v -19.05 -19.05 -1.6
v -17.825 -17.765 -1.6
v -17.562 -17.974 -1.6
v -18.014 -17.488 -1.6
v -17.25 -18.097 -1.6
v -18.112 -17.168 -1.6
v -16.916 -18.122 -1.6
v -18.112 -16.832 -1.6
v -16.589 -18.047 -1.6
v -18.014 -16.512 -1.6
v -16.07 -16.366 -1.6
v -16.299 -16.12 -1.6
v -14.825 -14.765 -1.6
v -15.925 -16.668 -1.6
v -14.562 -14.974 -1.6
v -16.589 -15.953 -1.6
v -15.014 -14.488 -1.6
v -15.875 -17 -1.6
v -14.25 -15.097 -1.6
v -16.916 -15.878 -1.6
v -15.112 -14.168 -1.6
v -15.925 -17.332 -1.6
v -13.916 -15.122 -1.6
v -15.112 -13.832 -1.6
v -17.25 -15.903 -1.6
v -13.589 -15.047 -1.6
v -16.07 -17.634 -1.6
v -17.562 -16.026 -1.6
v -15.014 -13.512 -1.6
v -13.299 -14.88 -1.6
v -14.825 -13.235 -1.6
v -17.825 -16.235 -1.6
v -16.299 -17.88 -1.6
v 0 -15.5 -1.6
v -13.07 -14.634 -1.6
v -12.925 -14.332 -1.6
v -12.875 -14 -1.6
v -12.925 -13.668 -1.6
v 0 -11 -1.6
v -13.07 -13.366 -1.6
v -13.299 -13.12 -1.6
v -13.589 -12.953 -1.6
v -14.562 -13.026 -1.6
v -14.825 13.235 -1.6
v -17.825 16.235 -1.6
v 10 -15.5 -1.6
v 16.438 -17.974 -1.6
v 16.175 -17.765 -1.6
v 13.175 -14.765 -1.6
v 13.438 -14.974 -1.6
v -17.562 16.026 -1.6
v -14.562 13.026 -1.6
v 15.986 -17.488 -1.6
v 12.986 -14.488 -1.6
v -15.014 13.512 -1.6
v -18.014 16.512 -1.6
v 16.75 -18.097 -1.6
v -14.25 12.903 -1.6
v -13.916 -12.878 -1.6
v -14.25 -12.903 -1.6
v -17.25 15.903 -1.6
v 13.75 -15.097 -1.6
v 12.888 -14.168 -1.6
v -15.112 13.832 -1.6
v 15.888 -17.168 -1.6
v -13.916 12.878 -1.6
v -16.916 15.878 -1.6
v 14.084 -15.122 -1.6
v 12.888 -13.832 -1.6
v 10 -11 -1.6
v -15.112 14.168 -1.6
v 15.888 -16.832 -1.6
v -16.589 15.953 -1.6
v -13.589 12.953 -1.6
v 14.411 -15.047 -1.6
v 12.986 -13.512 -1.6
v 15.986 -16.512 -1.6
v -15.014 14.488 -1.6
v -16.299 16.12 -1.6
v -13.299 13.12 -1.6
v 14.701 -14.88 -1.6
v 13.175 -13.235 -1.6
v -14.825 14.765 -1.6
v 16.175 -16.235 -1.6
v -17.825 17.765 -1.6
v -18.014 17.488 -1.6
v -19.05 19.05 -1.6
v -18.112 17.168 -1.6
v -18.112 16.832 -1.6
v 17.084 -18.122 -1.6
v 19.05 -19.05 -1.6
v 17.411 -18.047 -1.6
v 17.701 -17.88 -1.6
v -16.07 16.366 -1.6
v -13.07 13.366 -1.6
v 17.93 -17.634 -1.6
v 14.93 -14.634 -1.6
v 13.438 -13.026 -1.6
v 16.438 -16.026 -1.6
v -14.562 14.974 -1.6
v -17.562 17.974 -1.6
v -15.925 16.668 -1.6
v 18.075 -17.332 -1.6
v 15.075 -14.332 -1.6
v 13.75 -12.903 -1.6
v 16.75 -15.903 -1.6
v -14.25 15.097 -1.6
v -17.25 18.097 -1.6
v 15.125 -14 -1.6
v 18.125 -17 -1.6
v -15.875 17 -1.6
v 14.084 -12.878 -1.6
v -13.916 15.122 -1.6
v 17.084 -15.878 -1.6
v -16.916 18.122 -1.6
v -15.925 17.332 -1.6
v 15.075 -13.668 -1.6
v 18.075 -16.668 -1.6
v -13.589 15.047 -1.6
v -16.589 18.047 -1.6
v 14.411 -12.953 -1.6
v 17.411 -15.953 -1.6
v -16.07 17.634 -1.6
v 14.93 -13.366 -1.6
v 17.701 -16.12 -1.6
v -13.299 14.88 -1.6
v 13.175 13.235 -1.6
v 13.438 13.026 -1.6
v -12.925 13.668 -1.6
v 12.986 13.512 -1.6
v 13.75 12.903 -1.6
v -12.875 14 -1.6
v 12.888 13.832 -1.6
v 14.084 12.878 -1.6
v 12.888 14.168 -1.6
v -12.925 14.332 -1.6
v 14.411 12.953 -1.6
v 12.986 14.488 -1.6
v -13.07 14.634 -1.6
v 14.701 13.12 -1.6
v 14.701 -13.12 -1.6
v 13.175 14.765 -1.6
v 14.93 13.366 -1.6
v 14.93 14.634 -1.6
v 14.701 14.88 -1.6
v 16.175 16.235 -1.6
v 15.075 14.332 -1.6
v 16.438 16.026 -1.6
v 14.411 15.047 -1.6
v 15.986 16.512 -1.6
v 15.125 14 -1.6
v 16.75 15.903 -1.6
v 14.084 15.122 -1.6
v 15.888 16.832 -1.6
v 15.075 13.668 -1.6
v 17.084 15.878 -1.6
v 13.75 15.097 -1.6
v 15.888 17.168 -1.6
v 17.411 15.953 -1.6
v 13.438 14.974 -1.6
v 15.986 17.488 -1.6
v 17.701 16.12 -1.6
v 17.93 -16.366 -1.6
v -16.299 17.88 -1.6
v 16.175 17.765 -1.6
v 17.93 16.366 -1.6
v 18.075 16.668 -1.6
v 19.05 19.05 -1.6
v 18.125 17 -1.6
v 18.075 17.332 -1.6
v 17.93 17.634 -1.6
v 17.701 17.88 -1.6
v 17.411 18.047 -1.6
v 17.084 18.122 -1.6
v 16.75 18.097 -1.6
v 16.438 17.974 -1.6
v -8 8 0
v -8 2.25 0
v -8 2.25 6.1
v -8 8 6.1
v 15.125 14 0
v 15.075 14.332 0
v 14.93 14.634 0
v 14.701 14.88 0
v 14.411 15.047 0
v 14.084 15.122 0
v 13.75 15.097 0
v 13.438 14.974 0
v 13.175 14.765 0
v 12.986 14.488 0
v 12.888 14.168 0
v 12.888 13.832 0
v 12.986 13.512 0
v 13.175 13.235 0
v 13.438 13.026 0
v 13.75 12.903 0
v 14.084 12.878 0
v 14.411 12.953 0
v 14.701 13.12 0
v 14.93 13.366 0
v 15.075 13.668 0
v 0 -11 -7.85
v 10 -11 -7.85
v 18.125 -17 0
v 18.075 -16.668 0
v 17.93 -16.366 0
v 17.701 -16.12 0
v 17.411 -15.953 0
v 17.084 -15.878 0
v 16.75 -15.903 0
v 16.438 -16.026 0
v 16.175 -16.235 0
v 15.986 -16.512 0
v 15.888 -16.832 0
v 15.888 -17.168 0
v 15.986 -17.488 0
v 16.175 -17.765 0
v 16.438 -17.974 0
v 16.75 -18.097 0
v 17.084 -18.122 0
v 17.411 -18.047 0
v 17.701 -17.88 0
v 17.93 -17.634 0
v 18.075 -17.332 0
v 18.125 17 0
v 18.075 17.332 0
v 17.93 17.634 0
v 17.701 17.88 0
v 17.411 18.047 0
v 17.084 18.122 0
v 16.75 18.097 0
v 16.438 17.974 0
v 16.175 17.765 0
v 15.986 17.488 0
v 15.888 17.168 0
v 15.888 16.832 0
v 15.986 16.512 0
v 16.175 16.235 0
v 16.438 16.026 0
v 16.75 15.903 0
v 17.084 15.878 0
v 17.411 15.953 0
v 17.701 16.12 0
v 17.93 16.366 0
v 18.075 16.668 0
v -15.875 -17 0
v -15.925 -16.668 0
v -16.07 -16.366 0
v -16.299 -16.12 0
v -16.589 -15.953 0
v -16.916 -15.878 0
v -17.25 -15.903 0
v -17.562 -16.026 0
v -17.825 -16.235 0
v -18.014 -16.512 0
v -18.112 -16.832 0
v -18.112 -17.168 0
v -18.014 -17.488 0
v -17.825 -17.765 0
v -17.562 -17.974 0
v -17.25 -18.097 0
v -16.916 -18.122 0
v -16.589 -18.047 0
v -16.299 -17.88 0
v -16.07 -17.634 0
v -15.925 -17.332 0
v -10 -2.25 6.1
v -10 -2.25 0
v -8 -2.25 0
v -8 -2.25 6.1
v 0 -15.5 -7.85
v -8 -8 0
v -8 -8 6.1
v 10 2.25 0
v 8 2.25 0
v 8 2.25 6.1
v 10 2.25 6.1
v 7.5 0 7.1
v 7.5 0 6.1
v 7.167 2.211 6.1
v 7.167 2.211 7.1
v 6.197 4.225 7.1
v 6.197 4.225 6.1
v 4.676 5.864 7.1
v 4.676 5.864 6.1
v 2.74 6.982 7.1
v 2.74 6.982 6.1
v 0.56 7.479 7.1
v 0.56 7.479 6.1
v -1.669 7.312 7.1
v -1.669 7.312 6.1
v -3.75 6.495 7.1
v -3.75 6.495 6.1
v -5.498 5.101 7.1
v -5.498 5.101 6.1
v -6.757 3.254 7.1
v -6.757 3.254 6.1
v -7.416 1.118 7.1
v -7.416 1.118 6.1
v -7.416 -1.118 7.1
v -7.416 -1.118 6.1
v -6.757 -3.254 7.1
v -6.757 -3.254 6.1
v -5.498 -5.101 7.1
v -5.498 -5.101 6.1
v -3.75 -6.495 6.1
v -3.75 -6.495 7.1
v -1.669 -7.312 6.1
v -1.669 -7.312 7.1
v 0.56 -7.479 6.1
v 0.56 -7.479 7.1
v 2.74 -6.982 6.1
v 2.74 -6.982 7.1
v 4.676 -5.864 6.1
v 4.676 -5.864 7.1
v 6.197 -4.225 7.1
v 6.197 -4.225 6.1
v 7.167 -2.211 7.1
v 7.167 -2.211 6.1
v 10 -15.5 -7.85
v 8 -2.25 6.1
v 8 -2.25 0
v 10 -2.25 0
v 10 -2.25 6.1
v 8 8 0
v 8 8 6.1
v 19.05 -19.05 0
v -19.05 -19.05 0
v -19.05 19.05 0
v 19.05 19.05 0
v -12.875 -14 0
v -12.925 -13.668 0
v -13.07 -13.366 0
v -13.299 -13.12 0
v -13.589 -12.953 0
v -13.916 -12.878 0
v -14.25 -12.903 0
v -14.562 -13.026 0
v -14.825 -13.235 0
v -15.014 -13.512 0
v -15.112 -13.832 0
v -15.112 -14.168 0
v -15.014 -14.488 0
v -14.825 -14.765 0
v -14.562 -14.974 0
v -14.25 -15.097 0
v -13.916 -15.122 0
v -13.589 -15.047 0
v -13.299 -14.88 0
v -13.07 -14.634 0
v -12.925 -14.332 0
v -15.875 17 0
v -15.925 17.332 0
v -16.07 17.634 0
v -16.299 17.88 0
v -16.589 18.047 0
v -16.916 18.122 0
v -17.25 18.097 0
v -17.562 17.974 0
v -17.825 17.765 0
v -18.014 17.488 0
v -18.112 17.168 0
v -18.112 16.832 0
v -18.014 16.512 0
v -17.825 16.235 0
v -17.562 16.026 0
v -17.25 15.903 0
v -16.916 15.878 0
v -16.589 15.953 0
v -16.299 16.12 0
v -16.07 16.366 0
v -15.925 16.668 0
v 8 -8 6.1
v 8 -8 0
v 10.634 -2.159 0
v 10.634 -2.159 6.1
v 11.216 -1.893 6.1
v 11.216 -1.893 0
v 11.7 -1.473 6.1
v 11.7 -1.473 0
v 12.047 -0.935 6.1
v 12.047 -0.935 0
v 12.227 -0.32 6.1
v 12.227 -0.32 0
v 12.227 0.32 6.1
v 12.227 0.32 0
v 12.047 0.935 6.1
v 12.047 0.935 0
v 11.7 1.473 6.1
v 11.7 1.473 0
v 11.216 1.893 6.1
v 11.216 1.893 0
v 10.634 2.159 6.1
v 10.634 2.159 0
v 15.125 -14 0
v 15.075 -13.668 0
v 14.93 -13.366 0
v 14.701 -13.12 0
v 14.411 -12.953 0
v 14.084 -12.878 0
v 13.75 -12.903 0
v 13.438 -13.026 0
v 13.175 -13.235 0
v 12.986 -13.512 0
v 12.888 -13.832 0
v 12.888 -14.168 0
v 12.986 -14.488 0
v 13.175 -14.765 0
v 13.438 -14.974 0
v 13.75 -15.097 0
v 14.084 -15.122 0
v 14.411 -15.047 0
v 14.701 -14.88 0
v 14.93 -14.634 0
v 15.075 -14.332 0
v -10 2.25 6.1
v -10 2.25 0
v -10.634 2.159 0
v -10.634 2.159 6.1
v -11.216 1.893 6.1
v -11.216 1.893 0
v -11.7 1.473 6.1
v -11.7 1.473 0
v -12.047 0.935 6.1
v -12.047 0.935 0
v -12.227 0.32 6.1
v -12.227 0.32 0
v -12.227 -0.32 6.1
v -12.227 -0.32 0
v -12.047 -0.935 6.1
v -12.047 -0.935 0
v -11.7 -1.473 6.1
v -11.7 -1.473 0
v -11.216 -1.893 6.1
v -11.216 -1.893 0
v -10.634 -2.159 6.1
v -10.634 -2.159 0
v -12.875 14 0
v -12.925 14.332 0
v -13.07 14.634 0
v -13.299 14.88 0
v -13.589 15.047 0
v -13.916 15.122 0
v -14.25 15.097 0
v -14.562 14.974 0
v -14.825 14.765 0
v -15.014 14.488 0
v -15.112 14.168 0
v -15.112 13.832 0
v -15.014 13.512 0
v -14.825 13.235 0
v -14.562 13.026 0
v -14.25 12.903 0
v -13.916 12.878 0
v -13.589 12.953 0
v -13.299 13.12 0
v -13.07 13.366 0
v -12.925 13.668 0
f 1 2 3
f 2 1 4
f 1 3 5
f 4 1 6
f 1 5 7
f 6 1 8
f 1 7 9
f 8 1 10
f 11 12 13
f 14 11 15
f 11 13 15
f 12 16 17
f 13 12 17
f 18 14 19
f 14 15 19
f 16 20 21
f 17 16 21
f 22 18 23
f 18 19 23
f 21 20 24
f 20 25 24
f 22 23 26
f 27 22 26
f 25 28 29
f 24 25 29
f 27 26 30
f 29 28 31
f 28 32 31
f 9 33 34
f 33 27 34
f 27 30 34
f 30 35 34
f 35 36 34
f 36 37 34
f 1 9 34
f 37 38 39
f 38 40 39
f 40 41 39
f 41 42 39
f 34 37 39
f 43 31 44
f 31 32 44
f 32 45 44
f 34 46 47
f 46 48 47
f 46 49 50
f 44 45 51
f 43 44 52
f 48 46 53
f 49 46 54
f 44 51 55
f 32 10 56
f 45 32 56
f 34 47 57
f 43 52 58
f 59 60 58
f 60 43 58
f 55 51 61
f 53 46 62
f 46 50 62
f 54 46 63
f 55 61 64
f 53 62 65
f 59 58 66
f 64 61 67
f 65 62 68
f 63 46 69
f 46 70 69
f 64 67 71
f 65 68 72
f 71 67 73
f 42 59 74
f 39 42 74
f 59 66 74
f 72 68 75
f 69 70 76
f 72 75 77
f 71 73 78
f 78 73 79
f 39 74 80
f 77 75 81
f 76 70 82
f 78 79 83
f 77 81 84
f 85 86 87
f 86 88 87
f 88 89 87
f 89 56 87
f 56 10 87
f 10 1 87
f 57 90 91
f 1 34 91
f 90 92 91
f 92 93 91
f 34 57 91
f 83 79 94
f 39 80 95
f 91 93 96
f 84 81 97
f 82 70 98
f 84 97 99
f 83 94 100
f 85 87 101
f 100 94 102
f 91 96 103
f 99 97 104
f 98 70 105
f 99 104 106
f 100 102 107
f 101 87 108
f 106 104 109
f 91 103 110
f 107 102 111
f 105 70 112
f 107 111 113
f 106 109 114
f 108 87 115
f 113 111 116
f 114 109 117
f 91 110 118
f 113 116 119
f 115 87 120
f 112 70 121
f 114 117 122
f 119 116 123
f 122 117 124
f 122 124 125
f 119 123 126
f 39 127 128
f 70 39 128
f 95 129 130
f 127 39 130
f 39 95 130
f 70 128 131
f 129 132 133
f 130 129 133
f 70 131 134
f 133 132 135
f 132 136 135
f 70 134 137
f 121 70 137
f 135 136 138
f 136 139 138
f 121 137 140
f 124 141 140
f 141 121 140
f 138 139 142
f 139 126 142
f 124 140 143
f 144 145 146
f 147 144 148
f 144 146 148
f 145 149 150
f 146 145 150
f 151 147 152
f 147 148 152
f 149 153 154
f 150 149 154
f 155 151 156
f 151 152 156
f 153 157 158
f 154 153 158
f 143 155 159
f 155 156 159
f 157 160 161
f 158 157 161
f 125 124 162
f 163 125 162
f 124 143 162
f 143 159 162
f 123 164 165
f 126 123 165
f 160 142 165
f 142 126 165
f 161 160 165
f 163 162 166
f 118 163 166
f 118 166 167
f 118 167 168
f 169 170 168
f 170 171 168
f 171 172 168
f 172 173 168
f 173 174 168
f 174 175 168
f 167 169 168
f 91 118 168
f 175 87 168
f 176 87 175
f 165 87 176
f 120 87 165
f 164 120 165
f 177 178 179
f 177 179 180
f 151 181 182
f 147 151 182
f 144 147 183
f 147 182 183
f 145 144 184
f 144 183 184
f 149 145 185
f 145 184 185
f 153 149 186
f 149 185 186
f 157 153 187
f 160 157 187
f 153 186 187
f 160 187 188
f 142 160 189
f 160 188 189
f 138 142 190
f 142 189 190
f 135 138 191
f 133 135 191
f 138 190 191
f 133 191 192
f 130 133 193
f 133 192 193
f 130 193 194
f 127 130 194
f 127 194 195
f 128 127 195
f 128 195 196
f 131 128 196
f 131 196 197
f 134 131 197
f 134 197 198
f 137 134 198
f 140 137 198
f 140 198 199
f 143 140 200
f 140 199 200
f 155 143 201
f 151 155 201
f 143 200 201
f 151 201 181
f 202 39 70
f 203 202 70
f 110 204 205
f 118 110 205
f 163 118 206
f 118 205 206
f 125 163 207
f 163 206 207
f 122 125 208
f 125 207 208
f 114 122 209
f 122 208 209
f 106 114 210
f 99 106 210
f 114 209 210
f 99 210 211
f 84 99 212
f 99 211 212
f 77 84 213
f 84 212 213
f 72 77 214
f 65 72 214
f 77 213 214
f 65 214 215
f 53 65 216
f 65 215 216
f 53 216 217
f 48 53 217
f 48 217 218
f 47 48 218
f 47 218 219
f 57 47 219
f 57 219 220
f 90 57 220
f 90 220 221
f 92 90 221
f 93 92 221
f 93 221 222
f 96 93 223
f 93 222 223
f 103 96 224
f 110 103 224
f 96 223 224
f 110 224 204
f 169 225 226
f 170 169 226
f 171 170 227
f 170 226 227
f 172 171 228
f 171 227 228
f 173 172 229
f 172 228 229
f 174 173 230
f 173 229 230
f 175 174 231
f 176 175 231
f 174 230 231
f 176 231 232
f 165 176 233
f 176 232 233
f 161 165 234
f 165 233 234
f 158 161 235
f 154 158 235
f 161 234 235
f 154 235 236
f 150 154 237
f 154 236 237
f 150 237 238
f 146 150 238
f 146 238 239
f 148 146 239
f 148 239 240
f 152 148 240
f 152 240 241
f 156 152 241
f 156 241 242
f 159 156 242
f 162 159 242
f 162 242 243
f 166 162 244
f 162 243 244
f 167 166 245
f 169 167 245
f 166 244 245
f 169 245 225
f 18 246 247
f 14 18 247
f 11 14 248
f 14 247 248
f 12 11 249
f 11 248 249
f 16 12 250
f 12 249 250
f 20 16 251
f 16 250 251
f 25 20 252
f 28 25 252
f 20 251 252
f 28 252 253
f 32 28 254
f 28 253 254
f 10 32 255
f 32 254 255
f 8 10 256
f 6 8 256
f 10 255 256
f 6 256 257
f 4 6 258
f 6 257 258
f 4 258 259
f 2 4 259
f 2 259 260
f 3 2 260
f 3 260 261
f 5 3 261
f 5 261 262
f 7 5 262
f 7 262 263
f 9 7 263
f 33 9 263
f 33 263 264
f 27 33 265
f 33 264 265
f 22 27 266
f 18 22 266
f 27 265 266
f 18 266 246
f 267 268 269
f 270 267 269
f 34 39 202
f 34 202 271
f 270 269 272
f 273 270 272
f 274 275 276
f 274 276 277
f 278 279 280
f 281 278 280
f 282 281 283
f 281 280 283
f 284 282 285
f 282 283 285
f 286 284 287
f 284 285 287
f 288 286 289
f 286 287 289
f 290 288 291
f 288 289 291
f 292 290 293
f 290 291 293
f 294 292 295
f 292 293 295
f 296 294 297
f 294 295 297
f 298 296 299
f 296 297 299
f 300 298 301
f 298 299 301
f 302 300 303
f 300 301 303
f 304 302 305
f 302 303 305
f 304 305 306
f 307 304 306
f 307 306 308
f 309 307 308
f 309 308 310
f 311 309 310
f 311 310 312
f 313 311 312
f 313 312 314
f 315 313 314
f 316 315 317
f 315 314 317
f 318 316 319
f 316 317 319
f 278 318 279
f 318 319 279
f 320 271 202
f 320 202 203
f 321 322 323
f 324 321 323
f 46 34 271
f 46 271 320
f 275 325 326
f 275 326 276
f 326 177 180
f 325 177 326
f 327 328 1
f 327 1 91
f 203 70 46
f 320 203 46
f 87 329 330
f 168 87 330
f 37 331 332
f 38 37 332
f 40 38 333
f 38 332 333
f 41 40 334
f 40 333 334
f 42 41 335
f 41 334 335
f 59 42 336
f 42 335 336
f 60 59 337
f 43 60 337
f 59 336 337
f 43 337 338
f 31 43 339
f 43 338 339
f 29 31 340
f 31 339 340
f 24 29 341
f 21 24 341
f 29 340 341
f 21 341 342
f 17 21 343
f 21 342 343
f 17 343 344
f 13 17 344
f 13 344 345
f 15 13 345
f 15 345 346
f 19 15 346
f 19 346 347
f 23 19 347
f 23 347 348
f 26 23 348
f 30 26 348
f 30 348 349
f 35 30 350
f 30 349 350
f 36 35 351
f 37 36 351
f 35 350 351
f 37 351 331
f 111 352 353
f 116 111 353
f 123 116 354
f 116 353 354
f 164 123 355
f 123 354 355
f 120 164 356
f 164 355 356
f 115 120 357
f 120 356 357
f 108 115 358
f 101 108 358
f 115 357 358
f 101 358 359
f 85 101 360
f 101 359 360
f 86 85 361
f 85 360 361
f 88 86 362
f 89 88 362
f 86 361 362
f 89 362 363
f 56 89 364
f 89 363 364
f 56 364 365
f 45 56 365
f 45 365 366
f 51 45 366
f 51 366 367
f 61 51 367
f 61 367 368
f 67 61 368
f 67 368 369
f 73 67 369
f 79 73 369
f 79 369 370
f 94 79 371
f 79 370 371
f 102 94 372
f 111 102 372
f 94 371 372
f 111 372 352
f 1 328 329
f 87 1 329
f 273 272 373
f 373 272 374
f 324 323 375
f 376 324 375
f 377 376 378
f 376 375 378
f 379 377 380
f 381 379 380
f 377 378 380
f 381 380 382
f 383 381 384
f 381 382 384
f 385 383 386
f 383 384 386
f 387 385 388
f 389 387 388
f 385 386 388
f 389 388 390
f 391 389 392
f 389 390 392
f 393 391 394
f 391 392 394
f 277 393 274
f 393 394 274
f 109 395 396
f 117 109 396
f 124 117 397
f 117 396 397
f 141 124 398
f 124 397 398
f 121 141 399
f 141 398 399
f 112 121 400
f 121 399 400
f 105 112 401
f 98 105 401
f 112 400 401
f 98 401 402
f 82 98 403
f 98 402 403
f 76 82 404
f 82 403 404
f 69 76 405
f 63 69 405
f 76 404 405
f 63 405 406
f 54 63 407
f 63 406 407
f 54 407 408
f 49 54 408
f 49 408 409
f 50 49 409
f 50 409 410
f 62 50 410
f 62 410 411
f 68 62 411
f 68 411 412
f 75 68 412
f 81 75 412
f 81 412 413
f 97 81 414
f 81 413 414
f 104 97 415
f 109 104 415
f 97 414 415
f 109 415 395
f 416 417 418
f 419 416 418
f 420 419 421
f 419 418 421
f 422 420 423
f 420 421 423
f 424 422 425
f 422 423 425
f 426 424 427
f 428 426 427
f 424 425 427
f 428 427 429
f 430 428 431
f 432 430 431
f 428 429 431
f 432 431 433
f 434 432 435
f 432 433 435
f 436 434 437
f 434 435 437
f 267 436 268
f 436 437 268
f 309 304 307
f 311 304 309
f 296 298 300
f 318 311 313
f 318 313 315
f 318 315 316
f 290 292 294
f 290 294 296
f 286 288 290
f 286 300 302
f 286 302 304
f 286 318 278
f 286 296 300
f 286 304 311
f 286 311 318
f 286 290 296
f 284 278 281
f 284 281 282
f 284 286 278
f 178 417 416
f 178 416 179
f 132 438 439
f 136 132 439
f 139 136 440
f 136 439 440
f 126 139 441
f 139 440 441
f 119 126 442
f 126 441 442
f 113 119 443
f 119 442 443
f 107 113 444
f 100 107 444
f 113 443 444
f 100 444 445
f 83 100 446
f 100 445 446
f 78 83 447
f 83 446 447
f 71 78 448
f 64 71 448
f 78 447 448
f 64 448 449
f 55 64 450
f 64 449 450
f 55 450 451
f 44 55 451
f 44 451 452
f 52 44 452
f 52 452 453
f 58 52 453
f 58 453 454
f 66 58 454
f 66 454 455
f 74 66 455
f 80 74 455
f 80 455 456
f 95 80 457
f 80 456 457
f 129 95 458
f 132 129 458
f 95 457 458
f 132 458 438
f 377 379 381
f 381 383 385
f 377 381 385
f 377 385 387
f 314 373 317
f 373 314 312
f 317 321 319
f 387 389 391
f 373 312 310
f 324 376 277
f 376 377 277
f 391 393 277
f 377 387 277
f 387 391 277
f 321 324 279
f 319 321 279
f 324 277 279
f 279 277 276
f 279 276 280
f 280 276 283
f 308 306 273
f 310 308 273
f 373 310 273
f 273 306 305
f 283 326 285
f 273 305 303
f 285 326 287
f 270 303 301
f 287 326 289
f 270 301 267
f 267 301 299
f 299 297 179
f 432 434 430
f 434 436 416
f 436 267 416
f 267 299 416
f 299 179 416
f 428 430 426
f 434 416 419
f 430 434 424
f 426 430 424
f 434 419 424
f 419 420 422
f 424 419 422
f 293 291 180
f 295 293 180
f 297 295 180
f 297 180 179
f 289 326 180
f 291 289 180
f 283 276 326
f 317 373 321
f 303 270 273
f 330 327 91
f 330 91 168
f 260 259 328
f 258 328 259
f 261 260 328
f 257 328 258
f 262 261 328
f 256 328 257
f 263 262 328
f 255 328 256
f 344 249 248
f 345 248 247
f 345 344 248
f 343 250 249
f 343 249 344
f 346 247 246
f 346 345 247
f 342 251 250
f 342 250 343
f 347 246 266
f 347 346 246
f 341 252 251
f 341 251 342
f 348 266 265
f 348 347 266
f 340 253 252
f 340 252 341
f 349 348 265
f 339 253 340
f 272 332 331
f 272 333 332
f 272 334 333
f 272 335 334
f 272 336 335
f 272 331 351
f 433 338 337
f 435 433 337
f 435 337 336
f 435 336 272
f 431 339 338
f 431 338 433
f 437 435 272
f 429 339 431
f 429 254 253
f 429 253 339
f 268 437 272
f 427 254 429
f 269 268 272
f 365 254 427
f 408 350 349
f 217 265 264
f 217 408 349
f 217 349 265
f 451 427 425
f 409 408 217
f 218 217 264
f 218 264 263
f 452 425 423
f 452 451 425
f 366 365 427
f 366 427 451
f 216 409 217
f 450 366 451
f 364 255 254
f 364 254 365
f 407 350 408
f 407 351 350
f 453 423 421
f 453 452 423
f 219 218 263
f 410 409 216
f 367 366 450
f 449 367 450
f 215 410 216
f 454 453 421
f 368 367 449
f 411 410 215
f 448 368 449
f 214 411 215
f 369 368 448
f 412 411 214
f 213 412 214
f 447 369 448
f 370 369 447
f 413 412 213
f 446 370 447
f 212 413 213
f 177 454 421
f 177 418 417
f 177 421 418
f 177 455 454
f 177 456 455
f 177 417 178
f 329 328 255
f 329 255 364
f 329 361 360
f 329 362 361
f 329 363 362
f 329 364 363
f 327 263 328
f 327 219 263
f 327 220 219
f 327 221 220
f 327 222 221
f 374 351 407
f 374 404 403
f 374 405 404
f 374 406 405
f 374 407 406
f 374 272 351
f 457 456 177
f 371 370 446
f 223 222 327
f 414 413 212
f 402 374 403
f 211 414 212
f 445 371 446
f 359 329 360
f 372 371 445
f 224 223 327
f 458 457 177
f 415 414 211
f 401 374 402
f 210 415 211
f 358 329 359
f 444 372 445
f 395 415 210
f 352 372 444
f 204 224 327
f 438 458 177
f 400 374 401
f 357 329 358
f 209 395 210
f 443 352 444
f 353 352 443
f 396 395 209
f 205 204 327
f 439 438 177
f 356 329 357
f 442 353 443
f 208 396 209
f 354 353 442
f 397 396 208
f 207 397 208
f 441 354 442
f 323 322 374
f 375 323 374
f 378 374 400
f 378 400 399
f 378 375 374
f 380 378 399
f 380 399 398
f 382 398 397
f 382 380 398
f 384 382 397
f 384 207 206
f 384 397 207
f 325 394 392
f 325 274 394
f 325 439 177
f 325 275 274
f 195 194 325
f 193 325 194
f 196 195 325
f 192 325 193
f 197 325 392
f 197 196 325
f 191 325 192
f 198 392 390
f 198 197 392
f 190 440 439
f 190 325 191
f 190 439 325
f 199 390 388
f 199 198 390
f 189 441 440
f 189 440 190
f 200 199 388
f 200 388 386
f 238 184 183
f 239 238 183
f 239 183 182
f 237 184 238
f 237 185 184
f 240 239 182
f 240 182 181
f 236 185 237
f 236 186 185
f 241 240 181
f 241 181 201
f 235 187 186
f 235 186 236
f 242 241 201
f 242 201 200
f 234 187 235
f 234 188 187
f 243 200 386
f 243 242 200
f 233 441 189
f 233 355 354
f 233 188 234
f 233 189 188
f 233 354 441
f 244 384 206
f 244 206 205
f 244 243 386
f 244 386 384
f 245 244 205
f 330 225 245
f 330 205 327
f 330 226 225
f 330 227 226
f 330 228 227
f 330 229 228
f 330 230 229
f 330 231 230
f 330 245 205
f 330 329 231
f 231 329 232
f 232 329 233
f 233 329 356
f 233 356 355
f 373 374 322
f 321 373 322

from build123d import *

# Parameters (mm, degrees)
SKETCH_W     = 38.1
SKETCH_H     = 38.1
SKETCH_R     = 1.125
PAD_DEPTH    = 1.6
PAD001_DEPTH = 6.1
SKETCH002_R  = 7.5
PAD002_DEPTH = 1
SKETCH003_W  = 10
SKETCH003_H  = 4.5
PAD003_DEPTH = 6.25


with BuildPart() as part:
    # Sketch → Pad (new body)
    with BuildSketch(Plane.XY):
        Rectangle(SKETCH_W, SKETCH_H)
        with Locations((-14, 14)):
            Circle(SKETCH_R, mode=Mode.SUBTRACT)
        with Locations((14, 14)):
            Circle(SKETCH_R, mode=Mode.SUBTRACT)
        with Locations((14, -14)):
            Circle(SKETCH_R, mode=Mode.SUBTRACT)
        with Locations((-14, -14)):
            Circle(SKETCH_R, mode=Mode.SUBTRACT)
        with Locations((-17, 17)):
            Circle(SKETCH_R, mode=Mode.SUBTRACT)
        with Locations((17, 17)):
            Circle(SKETCH_R, mode=Mode.SUBTRACT)
        with Locations((17, -17)):
            Circle(SKETCH_R, mode=Mode.SUBTRACT)
        with Locations((-17, -17)):
            Circle(SKETCH_R, mode=Mode.SUBTRACT)
    extrude(amount=-PAD_DEPTH)

    # Sketch001 → Pad001 (join)
    with BuildSketch(Plane.XY):
        with BuildLine():
            Line((-8, 2.25), (-8, 8))
            Line((-8, 8), (8, 8))
            Line((8, 8), (8, 2.25))
            Line((8, 2.25), (10.000011, 2.25))
            ThreePointArc((10.000011, -2.25), (12.25, 0), (10.000011, 2.25))
            Line((8, -2.25), (10.000011, -2.25))
            Line((8, -8), (8, -2.25))
            Line((-8, -8), (8, -8))
            Line((-8, -2.25), (-8, -8))
            Line((-9.999989, -2.25), (-8, -2.25))
            ThreePointArc((-10, 2.25), (-12.25, -6e-06), (-9.999989, -2.25))
            Line((-10, 2.25), (-8, 2.25))
        make_face()
    extrude(amount=PAD001_DEPTH)

    # Sketch002 (on DatumPlane) → Pad002 (join)
    with BuildSketch(Plane.XY.offset(6.1)):
        Circle(SKETCH002_R)
    extrude(amount=PAD002_DEPTH)

    # Sketch003 (on DatumPlane) → Pad003 (join)
    with BuildSketch(Plane(origin=(0, 0, -1.6), x_dir=(1, 0, 0), z_dir=(0, 0, -1))):
        with Locations((5, 13.25)):
            Rectangle(SKETCH003_W, SKETCH003_H)
    extrude(amount=PAD003_DEPTH)


solid = part.part
